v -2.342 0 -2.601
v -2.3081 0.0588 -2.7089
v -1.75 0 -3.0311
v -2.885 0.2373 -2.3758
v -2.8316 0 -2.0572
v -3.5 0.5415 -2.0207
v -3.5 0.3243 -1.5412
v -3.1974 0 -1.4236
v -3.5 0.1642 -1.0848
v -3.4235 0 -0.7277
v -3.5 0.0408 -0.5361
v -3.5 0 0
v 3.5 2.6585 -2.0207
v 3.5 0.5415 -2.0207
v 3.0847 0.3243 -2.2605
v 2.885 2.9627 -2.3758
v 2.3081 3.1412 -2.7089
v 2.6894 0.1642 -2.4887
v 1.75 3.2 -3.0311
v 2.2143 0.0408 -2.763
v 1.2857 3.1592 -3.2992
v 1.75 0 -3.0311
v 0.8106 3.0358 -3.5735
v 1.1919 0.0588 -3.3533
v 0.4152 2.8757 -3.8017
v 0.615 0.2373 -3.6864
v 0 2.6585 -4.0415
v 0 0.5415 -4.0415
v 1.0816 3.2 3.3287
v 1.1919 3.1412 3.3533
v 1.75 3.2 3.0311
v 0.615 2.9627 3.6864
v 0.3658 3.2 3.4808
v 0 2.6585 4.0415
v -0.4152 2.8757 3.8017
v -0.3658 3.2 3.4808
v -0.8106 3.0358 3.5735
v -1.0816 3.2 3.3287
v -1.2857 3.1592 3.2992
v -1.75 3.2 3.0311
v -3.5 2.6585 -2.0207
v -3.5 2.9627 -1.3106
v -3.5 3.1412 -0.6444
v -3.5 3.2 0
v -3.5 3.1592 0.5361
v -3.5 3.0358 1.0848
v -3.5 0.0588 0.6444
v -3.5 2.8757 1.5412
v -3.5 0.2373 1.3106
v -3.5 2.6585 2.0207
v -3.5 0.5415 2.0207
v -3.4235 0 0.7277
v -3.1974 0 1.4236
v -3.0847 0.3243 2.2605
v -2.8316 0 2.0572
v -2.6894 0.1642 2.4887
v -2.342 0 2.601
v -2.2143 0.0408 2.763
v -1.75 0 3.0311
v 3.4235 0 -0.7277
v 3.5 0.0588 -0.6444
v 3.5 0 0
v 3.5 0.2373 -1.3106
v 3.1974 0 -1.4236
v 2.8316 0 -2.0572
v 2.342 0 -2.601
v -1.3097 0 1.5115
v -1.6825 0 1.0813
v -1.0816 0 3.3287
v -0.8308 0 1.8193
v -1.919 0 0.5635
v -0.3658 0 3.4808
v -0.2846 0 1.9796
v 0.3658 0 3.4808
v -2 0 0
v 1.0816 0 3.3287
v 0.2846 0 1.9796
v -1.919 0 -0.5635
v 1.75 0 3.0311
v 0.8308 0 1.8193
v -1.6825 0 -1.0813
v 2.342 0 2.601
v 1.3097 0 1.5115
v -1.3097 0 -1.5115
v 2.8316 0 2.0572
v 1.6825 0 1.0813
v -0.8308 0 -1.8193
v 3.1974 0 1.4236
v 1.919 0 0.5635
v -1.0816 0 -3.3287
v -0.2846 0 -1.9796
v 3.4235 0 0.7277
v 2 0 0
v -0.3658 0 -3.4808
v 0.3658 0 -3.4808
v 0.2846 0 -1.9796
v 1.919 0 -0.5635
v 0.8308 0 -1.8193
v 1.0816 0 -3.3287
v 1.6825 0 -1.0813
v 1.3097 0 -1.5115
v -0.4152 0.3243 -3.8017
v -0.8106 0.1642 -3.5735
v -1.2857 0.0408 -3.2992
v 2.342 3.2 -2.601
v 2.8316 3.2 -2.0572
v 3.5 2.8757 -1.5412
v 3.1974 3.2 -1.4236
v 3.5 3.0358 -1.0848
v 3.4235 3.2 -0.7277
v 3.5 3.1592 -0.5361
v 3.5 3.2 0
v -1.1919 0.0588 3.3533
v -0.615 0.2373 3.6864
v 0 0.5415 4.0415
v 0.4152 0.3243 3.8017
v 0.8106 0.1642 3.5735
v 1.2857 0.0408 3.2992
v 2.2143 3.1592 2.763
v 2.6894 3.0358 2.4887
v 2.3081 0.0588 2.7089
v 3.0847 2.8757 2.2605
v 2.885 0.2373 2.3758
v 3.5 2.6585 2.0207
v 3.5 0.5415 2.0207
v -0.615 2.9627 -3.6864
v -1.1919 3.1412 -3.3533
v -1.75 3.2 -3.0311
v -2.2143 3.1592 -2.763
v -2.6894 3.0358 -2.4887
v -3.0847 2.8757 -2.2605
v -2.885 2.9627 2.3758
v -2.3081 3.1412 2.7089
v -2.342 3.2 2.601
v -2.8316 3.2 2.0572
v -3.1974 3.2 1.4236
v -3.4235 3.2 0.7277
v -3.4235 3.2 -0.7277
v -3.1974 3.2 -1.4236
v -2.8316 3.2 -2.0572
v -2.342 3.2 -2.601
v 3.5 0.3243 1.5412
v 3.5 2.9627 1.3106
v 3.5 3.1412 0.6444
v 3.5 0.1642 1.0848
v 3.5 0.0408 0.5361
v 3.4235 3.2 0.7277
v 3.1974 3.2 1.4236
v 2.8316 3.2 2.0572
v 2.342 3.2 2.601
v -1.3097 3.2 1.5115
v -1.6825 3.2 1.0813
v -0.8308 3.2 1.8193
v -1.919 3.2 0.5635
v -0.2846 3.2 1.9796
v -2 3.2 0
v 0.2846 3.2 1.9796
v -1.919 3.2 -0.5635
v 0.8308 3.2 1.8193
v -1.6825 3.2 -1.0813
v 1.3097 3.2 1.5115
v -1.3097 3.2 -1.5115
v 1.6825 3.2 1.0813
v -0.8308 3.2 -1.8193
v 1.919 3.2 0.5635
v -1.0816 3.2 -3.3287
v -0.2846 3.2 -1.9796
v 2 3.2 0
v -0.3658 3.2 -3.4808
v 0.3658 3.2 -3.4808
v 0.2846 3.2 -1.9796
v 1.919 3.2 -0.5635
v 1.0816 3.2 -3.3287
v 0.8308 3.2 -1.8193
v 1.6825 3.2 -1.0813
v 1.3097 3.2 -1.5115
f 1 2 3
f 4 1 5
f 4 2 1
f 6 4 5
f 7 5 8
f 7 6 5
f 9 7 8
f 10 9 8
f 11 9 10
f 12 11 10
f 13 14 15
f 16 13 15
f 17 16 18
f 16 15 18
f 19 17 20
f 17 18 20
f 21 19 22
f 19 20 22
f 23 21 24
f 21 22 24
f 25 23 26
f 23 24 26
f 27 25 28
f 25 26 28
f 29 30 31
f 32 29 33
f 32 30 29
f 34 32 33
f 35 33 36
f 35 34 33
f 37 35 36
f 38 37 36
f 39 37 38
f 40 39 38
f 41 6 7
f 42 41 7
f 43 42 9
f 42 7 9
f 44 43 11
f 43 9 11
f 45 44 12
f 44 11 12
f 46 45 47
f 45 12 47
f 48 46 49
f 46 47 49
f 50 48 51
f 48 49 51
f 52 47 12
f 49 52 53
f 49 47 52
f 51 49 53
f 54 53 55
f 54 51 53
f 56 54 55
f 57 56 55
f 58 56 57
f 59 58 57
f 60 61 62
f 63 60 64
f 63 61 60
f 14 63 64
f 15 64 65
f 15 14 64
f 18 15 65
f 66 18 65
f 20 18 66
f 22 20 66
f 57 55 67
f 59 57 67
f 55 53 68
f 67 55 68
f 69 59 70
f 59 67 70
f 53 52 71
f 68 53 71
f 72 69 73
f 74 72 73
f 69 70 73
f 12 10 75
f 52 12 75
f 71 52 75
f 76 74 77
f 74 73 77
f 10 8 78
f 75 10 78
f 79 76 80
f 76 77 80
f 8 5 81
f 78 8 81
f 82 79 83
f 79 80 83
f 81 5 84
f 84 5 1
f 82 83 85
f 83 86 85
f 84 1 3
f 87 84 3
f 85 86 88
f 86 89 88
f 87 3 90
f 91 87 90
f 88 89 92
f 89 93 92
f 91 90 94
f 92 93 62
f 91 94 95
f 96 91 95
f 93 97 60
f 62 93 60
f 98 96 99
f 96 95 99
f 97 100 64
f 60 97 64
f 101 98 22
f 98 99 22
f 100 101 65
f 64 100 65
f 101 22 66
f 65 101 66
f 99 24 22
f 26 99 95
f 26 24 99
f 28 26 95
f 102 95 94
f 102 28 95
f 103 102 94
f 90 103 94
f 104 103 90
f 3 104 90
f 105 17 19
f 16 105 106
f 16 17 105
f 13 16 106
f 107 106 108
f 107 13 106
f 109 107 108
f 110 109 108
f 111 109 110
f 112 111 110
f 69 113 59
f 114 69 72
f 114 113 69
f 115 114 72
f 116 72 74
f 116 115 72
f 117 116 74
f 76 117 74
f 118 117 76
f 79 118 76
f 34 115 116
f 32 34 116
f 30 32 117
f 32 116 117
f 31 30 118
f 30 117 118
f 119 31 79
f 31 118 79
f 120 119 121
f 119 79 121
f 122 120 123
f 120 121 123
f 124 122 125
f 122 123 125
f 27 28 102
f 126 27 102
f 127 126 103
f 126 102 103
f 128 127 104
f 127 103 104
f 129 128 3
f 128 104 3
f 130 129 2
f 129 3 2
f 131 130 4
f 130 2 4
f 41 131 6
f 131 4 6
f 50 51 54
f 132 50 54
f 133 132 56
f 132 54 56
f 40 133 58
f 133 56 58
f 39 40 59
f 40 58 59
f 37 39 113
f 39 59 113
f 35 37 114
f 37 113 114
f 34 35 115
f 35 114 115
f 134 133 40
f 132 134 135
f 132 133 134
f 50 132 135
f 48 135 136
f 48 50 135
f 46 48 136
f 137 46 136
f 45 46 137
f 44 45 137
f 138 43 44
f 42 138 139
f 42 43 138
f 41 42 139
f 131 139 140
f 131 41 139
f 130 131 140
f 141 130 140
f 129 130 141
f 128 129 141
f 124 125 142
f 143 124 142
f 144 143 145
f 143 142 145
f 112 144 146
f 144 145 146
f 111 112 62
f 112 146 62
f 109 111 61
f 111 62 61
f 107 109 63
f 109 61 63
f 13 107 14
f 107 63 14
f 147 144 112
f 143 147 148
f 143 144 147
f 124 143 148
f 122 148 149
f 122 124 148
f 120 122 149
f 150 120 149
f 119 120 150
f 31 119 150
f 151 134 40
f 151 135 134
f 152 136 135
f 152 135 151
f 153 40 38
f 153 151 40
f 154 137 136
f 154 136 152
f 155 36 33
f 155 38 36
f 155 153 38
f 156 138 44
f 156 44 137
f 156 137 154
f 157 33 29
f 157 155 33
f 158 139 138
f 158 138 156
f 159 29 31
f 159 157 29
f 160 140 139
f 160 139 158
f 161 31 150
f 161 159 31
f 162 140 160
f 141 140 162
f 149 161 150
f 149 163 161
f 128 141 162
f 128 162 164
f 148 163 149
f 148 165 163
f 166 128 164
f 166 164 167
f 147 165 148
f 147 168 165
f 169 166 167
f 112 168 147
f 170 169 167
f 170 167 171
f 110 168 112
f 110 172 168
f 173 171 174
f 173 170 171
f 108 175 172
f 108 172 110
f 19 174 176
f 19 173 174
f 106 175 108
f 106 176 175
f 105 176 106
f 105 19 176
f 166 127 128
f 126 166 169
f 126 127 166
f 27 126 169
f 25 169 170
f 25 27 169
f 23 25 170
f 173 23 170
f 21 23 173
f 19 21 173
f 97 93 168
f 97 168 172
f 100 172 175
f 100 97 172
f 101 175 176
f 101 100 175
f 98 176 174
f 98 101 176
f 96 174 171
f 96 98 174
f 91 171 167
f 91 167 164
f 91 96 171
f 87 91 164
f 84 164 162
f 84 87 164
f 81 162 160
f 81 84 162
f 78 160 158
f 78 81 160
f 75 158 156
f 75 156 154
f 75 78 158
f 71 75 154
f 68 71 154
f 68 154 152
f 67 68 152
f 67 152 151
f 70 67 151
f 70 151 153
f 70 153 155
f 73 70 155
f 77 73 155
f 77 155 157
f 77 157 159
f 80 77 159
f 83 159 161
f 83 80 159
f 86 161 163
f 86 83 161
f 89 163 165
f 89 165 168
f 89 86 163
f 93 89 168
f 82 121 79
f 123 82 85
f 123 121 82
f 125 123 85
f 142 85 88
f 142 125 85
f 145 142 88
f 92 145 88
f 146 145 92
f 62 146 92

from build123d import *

# Parameters (mm, degrees)
SKETCH1_R           = 2
BOSS_EXTRUDE1_DEPTH = 3.2
SKETCH2_OUTSIDE_W   = 19.632
SKETCH2_OUTSIDE_H   = 20.714
SKETCH2_OUTSIDE_R   = 3.5
CUT_EXTRUDE1_DEPTH  = 4.2
CUT_EXTRUDE1_TAPER  = 45
SKETCH3_OUTSIDE_W   = 19.632
SKETCH3_OUTSIDE_H   = 20.714
SKETCH3_OUTSIDE_R   = 3.5
CUT_EXTRUDE2_DEPTH  = 4.2
CUT_EXTRUDE2_TAPER  = 45


with BuildPart() as part:
    # Sketch1 → Boss-Extrude1 (new body)
    with BuildSketch(Plane(origin=(0, 0, 0), x_dir=(1, 0, 0), z_dir=(0, 1, 0))):
        Polygon((0, 4.041451884), (-3.5, 2.020725942), (-3.5, -2.020725942), (0, -4.041451884), (3.5, -2.020725942), (3.5, 2.020725942), align=None)
        Circle(SKETCH1_R, mode=Mode.SUBTRACT)
    extrude(amount=BOSS_EXTRUDE1_DEPTH)

    # Sketch2 outside → Cut-Extrude1 (cut, through all)
    with BuildSketch(Plane(origin=(0, 3.2, 0), x_dir=(1, 0, 0), z_dir=(0, 1, 0))):
        Rectangle(SKETCH2_OUTSIDE_W, SKETCH2_OUTSIDE_H)
        Circle(SKETCH2_OUTSIDE_R, mode=Mode.SUBTRACT)
    extrude(amount=-CUT_EXTRUDE1_DEPTH, taper=CUT_EXTRUDE1_TAPER, mode=Mode.SUBTRACT)

    # Sketch3 outside → Cut-Extrude2 (cut, through all)
    with BuildSketch(Plane.XZ):
        Rectangle(SKETCH3_OUTSIDE_W, SKETCH3_OUTSIDE_H)
        Circle(SKETCH3_OUTSIDE_R, mode=Mode.SUBTRACT)
    extrude(amount=-CUT_EXTRUDE2_DEPTH, taper=CUT_EXTRUDE2_TAPER, mode=Mode.SUBTRACT)


solid = part.part
